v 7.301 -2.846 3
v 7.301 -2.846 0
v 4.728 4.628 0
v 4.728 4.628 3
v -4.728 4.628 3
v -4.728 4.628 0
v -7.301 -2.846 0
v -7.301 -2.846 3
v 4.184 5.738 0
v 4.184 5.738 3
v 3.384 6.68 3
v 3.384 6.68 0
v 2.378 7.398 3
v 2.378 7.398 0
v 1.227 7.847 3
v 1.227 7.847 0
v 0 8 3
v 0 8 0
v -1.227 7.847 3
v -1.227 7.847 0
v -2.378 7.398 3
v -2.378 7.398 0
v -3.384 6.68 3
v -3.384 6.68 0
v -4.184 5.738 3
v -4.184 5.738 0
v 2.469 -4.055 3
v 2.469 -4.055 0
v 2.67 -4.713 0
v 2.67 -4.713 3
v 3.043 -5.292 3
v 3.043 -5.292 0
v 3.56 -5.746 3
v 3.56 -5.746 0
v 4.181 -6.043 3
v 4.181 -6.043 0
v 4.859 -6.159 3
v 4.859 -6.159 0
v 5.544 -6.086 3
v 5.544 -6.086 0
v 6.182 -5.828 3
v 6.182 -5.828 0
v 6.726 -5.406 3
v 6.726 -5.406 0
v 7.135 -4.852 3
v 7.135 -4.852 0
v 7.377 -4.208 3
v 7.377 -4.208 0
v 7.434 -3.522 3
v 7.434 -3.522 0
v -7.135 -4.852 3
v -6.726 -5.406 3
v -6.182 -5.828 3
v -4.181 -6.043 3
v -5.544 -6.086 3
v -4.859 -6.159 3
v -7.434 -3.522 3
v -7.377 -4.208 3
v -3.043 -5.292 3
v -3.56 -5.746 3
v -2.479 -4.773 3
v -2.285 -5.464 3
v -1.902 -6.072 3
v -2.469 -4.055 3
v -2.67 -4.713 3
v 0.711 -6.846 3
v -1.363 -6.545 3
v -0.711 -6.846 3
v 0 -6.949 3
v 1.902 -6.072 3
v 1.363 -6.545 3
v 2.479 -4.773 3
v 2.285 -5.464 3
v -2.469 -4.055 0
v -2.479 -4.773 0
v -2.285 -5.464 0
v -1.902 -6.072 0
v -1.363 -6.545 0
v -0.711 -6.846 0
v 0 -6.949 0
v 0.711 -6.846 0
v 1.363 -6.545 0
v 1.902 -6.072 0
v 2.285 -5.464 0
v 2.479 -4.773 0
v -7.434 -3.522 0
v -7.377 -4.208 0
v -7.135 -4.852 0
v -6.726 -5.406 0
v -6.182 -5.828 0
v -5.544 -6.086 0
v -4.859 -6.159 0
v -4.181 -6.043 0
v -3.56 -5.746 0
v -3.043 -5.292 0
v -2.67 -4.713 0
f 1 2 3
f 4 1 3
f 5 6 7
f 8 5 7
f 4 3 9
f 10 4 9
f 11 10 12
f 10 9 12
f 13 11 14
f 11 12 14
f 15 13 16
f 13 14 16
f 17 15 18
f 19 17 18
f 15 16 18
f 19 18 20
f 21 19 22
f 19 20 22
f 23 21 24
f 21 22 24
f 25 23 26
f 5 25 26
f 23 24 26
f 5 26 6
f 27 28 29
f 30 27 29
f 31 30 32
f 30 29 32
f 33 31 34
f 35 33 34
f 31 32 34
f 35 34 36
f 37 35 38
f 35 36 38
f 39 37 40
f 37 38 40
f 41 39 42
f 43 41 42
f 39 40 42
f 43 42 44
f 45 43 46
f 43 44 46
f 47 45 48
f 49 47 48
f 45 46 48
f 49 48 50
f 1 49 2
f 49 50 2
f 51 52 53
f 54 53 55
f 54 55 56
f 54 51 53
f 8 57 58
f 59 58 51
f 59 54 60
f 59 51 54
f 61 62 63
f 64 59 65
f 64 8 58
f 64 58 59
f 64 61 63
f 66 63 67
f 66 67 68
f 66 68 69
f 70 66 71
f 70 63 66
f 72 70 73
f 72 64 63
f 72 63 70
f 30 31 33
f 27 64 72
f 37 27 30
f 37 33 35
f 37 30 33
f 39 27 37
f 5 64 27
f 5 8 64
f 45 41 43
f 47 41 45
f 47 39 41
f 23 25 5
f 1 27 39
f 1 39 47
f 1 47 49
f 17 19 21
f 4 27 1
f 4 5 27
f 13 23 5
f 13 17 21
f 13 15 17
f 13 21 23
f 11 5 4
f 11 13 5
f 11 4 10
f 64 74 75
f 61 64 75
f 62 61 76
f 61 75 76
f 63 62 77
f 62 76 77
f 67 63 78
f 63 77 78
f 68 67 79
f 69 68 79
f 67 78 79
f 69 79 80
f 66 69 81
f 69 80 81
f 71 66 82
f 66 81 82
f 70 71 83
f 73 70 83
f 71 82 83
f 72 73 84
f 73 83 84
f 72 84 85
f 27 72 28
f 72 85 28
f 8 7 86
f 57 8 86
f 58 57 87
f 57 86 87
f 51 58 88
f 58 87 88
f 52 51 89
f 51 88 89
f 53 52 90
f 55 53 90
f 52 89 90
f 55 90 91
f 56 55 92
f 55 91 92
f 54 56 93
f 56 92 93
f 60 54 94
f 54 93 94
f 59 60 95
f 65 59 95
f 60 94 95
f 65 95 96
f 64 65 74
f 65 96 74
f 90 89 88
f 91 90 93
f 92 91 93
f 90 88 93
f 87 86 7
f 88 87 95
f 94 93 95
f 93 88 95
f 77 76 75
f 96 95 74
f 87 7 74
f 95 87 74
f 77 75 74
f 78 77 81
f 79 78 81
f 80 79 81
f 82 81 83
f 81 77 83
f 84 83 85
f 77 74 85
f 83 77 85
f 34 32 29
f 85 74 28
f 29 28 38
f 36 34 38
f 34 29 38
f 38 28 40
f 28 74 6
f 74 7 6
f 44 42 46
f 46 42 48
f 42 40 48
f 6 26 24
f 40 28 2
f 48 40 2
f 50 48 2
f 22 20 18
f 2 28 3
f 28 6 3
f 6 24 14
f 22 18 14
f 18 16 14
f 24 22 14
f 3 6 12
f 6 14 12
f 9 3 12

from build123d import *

# Parameters (mm, degrees)
SALIENTE_EXTRUIR1_DEPTH = 3


with BuildPart() as part:
    # Croquis1 → Saliente-Extruir1 (new body)
    with BuildSketch(Plane.XY):
        with BuildLine():
            Line((-4.727593517, 4.627838916), (-7.301146697, -2.846311758))
            ThreePointArc((-7.301146697, -2.846311758), (-5.543839597, -6.085549813), (-2.468674969, -4.054748512))
            ThreePointArc((-2.468674969, -4.054748512), (0, -6.949265807), (2.468674969, -4.054748512))
            ThreePointArc((2.468674969, -4.054748512), (5.543839597, -6.085549813), (7.301146697, -2.846311758))
            Line((7.301146697, -2.846311758), (4.727593517, 4.627838916))
            ThreePointArc((4.727593517, 4.627838916), (0, 8), (-4.727593517, 4.627838916))
        make_face()
    extrude(amount=SALIENTE_EXTRUIR1_DEPTH)


solid = part.part
